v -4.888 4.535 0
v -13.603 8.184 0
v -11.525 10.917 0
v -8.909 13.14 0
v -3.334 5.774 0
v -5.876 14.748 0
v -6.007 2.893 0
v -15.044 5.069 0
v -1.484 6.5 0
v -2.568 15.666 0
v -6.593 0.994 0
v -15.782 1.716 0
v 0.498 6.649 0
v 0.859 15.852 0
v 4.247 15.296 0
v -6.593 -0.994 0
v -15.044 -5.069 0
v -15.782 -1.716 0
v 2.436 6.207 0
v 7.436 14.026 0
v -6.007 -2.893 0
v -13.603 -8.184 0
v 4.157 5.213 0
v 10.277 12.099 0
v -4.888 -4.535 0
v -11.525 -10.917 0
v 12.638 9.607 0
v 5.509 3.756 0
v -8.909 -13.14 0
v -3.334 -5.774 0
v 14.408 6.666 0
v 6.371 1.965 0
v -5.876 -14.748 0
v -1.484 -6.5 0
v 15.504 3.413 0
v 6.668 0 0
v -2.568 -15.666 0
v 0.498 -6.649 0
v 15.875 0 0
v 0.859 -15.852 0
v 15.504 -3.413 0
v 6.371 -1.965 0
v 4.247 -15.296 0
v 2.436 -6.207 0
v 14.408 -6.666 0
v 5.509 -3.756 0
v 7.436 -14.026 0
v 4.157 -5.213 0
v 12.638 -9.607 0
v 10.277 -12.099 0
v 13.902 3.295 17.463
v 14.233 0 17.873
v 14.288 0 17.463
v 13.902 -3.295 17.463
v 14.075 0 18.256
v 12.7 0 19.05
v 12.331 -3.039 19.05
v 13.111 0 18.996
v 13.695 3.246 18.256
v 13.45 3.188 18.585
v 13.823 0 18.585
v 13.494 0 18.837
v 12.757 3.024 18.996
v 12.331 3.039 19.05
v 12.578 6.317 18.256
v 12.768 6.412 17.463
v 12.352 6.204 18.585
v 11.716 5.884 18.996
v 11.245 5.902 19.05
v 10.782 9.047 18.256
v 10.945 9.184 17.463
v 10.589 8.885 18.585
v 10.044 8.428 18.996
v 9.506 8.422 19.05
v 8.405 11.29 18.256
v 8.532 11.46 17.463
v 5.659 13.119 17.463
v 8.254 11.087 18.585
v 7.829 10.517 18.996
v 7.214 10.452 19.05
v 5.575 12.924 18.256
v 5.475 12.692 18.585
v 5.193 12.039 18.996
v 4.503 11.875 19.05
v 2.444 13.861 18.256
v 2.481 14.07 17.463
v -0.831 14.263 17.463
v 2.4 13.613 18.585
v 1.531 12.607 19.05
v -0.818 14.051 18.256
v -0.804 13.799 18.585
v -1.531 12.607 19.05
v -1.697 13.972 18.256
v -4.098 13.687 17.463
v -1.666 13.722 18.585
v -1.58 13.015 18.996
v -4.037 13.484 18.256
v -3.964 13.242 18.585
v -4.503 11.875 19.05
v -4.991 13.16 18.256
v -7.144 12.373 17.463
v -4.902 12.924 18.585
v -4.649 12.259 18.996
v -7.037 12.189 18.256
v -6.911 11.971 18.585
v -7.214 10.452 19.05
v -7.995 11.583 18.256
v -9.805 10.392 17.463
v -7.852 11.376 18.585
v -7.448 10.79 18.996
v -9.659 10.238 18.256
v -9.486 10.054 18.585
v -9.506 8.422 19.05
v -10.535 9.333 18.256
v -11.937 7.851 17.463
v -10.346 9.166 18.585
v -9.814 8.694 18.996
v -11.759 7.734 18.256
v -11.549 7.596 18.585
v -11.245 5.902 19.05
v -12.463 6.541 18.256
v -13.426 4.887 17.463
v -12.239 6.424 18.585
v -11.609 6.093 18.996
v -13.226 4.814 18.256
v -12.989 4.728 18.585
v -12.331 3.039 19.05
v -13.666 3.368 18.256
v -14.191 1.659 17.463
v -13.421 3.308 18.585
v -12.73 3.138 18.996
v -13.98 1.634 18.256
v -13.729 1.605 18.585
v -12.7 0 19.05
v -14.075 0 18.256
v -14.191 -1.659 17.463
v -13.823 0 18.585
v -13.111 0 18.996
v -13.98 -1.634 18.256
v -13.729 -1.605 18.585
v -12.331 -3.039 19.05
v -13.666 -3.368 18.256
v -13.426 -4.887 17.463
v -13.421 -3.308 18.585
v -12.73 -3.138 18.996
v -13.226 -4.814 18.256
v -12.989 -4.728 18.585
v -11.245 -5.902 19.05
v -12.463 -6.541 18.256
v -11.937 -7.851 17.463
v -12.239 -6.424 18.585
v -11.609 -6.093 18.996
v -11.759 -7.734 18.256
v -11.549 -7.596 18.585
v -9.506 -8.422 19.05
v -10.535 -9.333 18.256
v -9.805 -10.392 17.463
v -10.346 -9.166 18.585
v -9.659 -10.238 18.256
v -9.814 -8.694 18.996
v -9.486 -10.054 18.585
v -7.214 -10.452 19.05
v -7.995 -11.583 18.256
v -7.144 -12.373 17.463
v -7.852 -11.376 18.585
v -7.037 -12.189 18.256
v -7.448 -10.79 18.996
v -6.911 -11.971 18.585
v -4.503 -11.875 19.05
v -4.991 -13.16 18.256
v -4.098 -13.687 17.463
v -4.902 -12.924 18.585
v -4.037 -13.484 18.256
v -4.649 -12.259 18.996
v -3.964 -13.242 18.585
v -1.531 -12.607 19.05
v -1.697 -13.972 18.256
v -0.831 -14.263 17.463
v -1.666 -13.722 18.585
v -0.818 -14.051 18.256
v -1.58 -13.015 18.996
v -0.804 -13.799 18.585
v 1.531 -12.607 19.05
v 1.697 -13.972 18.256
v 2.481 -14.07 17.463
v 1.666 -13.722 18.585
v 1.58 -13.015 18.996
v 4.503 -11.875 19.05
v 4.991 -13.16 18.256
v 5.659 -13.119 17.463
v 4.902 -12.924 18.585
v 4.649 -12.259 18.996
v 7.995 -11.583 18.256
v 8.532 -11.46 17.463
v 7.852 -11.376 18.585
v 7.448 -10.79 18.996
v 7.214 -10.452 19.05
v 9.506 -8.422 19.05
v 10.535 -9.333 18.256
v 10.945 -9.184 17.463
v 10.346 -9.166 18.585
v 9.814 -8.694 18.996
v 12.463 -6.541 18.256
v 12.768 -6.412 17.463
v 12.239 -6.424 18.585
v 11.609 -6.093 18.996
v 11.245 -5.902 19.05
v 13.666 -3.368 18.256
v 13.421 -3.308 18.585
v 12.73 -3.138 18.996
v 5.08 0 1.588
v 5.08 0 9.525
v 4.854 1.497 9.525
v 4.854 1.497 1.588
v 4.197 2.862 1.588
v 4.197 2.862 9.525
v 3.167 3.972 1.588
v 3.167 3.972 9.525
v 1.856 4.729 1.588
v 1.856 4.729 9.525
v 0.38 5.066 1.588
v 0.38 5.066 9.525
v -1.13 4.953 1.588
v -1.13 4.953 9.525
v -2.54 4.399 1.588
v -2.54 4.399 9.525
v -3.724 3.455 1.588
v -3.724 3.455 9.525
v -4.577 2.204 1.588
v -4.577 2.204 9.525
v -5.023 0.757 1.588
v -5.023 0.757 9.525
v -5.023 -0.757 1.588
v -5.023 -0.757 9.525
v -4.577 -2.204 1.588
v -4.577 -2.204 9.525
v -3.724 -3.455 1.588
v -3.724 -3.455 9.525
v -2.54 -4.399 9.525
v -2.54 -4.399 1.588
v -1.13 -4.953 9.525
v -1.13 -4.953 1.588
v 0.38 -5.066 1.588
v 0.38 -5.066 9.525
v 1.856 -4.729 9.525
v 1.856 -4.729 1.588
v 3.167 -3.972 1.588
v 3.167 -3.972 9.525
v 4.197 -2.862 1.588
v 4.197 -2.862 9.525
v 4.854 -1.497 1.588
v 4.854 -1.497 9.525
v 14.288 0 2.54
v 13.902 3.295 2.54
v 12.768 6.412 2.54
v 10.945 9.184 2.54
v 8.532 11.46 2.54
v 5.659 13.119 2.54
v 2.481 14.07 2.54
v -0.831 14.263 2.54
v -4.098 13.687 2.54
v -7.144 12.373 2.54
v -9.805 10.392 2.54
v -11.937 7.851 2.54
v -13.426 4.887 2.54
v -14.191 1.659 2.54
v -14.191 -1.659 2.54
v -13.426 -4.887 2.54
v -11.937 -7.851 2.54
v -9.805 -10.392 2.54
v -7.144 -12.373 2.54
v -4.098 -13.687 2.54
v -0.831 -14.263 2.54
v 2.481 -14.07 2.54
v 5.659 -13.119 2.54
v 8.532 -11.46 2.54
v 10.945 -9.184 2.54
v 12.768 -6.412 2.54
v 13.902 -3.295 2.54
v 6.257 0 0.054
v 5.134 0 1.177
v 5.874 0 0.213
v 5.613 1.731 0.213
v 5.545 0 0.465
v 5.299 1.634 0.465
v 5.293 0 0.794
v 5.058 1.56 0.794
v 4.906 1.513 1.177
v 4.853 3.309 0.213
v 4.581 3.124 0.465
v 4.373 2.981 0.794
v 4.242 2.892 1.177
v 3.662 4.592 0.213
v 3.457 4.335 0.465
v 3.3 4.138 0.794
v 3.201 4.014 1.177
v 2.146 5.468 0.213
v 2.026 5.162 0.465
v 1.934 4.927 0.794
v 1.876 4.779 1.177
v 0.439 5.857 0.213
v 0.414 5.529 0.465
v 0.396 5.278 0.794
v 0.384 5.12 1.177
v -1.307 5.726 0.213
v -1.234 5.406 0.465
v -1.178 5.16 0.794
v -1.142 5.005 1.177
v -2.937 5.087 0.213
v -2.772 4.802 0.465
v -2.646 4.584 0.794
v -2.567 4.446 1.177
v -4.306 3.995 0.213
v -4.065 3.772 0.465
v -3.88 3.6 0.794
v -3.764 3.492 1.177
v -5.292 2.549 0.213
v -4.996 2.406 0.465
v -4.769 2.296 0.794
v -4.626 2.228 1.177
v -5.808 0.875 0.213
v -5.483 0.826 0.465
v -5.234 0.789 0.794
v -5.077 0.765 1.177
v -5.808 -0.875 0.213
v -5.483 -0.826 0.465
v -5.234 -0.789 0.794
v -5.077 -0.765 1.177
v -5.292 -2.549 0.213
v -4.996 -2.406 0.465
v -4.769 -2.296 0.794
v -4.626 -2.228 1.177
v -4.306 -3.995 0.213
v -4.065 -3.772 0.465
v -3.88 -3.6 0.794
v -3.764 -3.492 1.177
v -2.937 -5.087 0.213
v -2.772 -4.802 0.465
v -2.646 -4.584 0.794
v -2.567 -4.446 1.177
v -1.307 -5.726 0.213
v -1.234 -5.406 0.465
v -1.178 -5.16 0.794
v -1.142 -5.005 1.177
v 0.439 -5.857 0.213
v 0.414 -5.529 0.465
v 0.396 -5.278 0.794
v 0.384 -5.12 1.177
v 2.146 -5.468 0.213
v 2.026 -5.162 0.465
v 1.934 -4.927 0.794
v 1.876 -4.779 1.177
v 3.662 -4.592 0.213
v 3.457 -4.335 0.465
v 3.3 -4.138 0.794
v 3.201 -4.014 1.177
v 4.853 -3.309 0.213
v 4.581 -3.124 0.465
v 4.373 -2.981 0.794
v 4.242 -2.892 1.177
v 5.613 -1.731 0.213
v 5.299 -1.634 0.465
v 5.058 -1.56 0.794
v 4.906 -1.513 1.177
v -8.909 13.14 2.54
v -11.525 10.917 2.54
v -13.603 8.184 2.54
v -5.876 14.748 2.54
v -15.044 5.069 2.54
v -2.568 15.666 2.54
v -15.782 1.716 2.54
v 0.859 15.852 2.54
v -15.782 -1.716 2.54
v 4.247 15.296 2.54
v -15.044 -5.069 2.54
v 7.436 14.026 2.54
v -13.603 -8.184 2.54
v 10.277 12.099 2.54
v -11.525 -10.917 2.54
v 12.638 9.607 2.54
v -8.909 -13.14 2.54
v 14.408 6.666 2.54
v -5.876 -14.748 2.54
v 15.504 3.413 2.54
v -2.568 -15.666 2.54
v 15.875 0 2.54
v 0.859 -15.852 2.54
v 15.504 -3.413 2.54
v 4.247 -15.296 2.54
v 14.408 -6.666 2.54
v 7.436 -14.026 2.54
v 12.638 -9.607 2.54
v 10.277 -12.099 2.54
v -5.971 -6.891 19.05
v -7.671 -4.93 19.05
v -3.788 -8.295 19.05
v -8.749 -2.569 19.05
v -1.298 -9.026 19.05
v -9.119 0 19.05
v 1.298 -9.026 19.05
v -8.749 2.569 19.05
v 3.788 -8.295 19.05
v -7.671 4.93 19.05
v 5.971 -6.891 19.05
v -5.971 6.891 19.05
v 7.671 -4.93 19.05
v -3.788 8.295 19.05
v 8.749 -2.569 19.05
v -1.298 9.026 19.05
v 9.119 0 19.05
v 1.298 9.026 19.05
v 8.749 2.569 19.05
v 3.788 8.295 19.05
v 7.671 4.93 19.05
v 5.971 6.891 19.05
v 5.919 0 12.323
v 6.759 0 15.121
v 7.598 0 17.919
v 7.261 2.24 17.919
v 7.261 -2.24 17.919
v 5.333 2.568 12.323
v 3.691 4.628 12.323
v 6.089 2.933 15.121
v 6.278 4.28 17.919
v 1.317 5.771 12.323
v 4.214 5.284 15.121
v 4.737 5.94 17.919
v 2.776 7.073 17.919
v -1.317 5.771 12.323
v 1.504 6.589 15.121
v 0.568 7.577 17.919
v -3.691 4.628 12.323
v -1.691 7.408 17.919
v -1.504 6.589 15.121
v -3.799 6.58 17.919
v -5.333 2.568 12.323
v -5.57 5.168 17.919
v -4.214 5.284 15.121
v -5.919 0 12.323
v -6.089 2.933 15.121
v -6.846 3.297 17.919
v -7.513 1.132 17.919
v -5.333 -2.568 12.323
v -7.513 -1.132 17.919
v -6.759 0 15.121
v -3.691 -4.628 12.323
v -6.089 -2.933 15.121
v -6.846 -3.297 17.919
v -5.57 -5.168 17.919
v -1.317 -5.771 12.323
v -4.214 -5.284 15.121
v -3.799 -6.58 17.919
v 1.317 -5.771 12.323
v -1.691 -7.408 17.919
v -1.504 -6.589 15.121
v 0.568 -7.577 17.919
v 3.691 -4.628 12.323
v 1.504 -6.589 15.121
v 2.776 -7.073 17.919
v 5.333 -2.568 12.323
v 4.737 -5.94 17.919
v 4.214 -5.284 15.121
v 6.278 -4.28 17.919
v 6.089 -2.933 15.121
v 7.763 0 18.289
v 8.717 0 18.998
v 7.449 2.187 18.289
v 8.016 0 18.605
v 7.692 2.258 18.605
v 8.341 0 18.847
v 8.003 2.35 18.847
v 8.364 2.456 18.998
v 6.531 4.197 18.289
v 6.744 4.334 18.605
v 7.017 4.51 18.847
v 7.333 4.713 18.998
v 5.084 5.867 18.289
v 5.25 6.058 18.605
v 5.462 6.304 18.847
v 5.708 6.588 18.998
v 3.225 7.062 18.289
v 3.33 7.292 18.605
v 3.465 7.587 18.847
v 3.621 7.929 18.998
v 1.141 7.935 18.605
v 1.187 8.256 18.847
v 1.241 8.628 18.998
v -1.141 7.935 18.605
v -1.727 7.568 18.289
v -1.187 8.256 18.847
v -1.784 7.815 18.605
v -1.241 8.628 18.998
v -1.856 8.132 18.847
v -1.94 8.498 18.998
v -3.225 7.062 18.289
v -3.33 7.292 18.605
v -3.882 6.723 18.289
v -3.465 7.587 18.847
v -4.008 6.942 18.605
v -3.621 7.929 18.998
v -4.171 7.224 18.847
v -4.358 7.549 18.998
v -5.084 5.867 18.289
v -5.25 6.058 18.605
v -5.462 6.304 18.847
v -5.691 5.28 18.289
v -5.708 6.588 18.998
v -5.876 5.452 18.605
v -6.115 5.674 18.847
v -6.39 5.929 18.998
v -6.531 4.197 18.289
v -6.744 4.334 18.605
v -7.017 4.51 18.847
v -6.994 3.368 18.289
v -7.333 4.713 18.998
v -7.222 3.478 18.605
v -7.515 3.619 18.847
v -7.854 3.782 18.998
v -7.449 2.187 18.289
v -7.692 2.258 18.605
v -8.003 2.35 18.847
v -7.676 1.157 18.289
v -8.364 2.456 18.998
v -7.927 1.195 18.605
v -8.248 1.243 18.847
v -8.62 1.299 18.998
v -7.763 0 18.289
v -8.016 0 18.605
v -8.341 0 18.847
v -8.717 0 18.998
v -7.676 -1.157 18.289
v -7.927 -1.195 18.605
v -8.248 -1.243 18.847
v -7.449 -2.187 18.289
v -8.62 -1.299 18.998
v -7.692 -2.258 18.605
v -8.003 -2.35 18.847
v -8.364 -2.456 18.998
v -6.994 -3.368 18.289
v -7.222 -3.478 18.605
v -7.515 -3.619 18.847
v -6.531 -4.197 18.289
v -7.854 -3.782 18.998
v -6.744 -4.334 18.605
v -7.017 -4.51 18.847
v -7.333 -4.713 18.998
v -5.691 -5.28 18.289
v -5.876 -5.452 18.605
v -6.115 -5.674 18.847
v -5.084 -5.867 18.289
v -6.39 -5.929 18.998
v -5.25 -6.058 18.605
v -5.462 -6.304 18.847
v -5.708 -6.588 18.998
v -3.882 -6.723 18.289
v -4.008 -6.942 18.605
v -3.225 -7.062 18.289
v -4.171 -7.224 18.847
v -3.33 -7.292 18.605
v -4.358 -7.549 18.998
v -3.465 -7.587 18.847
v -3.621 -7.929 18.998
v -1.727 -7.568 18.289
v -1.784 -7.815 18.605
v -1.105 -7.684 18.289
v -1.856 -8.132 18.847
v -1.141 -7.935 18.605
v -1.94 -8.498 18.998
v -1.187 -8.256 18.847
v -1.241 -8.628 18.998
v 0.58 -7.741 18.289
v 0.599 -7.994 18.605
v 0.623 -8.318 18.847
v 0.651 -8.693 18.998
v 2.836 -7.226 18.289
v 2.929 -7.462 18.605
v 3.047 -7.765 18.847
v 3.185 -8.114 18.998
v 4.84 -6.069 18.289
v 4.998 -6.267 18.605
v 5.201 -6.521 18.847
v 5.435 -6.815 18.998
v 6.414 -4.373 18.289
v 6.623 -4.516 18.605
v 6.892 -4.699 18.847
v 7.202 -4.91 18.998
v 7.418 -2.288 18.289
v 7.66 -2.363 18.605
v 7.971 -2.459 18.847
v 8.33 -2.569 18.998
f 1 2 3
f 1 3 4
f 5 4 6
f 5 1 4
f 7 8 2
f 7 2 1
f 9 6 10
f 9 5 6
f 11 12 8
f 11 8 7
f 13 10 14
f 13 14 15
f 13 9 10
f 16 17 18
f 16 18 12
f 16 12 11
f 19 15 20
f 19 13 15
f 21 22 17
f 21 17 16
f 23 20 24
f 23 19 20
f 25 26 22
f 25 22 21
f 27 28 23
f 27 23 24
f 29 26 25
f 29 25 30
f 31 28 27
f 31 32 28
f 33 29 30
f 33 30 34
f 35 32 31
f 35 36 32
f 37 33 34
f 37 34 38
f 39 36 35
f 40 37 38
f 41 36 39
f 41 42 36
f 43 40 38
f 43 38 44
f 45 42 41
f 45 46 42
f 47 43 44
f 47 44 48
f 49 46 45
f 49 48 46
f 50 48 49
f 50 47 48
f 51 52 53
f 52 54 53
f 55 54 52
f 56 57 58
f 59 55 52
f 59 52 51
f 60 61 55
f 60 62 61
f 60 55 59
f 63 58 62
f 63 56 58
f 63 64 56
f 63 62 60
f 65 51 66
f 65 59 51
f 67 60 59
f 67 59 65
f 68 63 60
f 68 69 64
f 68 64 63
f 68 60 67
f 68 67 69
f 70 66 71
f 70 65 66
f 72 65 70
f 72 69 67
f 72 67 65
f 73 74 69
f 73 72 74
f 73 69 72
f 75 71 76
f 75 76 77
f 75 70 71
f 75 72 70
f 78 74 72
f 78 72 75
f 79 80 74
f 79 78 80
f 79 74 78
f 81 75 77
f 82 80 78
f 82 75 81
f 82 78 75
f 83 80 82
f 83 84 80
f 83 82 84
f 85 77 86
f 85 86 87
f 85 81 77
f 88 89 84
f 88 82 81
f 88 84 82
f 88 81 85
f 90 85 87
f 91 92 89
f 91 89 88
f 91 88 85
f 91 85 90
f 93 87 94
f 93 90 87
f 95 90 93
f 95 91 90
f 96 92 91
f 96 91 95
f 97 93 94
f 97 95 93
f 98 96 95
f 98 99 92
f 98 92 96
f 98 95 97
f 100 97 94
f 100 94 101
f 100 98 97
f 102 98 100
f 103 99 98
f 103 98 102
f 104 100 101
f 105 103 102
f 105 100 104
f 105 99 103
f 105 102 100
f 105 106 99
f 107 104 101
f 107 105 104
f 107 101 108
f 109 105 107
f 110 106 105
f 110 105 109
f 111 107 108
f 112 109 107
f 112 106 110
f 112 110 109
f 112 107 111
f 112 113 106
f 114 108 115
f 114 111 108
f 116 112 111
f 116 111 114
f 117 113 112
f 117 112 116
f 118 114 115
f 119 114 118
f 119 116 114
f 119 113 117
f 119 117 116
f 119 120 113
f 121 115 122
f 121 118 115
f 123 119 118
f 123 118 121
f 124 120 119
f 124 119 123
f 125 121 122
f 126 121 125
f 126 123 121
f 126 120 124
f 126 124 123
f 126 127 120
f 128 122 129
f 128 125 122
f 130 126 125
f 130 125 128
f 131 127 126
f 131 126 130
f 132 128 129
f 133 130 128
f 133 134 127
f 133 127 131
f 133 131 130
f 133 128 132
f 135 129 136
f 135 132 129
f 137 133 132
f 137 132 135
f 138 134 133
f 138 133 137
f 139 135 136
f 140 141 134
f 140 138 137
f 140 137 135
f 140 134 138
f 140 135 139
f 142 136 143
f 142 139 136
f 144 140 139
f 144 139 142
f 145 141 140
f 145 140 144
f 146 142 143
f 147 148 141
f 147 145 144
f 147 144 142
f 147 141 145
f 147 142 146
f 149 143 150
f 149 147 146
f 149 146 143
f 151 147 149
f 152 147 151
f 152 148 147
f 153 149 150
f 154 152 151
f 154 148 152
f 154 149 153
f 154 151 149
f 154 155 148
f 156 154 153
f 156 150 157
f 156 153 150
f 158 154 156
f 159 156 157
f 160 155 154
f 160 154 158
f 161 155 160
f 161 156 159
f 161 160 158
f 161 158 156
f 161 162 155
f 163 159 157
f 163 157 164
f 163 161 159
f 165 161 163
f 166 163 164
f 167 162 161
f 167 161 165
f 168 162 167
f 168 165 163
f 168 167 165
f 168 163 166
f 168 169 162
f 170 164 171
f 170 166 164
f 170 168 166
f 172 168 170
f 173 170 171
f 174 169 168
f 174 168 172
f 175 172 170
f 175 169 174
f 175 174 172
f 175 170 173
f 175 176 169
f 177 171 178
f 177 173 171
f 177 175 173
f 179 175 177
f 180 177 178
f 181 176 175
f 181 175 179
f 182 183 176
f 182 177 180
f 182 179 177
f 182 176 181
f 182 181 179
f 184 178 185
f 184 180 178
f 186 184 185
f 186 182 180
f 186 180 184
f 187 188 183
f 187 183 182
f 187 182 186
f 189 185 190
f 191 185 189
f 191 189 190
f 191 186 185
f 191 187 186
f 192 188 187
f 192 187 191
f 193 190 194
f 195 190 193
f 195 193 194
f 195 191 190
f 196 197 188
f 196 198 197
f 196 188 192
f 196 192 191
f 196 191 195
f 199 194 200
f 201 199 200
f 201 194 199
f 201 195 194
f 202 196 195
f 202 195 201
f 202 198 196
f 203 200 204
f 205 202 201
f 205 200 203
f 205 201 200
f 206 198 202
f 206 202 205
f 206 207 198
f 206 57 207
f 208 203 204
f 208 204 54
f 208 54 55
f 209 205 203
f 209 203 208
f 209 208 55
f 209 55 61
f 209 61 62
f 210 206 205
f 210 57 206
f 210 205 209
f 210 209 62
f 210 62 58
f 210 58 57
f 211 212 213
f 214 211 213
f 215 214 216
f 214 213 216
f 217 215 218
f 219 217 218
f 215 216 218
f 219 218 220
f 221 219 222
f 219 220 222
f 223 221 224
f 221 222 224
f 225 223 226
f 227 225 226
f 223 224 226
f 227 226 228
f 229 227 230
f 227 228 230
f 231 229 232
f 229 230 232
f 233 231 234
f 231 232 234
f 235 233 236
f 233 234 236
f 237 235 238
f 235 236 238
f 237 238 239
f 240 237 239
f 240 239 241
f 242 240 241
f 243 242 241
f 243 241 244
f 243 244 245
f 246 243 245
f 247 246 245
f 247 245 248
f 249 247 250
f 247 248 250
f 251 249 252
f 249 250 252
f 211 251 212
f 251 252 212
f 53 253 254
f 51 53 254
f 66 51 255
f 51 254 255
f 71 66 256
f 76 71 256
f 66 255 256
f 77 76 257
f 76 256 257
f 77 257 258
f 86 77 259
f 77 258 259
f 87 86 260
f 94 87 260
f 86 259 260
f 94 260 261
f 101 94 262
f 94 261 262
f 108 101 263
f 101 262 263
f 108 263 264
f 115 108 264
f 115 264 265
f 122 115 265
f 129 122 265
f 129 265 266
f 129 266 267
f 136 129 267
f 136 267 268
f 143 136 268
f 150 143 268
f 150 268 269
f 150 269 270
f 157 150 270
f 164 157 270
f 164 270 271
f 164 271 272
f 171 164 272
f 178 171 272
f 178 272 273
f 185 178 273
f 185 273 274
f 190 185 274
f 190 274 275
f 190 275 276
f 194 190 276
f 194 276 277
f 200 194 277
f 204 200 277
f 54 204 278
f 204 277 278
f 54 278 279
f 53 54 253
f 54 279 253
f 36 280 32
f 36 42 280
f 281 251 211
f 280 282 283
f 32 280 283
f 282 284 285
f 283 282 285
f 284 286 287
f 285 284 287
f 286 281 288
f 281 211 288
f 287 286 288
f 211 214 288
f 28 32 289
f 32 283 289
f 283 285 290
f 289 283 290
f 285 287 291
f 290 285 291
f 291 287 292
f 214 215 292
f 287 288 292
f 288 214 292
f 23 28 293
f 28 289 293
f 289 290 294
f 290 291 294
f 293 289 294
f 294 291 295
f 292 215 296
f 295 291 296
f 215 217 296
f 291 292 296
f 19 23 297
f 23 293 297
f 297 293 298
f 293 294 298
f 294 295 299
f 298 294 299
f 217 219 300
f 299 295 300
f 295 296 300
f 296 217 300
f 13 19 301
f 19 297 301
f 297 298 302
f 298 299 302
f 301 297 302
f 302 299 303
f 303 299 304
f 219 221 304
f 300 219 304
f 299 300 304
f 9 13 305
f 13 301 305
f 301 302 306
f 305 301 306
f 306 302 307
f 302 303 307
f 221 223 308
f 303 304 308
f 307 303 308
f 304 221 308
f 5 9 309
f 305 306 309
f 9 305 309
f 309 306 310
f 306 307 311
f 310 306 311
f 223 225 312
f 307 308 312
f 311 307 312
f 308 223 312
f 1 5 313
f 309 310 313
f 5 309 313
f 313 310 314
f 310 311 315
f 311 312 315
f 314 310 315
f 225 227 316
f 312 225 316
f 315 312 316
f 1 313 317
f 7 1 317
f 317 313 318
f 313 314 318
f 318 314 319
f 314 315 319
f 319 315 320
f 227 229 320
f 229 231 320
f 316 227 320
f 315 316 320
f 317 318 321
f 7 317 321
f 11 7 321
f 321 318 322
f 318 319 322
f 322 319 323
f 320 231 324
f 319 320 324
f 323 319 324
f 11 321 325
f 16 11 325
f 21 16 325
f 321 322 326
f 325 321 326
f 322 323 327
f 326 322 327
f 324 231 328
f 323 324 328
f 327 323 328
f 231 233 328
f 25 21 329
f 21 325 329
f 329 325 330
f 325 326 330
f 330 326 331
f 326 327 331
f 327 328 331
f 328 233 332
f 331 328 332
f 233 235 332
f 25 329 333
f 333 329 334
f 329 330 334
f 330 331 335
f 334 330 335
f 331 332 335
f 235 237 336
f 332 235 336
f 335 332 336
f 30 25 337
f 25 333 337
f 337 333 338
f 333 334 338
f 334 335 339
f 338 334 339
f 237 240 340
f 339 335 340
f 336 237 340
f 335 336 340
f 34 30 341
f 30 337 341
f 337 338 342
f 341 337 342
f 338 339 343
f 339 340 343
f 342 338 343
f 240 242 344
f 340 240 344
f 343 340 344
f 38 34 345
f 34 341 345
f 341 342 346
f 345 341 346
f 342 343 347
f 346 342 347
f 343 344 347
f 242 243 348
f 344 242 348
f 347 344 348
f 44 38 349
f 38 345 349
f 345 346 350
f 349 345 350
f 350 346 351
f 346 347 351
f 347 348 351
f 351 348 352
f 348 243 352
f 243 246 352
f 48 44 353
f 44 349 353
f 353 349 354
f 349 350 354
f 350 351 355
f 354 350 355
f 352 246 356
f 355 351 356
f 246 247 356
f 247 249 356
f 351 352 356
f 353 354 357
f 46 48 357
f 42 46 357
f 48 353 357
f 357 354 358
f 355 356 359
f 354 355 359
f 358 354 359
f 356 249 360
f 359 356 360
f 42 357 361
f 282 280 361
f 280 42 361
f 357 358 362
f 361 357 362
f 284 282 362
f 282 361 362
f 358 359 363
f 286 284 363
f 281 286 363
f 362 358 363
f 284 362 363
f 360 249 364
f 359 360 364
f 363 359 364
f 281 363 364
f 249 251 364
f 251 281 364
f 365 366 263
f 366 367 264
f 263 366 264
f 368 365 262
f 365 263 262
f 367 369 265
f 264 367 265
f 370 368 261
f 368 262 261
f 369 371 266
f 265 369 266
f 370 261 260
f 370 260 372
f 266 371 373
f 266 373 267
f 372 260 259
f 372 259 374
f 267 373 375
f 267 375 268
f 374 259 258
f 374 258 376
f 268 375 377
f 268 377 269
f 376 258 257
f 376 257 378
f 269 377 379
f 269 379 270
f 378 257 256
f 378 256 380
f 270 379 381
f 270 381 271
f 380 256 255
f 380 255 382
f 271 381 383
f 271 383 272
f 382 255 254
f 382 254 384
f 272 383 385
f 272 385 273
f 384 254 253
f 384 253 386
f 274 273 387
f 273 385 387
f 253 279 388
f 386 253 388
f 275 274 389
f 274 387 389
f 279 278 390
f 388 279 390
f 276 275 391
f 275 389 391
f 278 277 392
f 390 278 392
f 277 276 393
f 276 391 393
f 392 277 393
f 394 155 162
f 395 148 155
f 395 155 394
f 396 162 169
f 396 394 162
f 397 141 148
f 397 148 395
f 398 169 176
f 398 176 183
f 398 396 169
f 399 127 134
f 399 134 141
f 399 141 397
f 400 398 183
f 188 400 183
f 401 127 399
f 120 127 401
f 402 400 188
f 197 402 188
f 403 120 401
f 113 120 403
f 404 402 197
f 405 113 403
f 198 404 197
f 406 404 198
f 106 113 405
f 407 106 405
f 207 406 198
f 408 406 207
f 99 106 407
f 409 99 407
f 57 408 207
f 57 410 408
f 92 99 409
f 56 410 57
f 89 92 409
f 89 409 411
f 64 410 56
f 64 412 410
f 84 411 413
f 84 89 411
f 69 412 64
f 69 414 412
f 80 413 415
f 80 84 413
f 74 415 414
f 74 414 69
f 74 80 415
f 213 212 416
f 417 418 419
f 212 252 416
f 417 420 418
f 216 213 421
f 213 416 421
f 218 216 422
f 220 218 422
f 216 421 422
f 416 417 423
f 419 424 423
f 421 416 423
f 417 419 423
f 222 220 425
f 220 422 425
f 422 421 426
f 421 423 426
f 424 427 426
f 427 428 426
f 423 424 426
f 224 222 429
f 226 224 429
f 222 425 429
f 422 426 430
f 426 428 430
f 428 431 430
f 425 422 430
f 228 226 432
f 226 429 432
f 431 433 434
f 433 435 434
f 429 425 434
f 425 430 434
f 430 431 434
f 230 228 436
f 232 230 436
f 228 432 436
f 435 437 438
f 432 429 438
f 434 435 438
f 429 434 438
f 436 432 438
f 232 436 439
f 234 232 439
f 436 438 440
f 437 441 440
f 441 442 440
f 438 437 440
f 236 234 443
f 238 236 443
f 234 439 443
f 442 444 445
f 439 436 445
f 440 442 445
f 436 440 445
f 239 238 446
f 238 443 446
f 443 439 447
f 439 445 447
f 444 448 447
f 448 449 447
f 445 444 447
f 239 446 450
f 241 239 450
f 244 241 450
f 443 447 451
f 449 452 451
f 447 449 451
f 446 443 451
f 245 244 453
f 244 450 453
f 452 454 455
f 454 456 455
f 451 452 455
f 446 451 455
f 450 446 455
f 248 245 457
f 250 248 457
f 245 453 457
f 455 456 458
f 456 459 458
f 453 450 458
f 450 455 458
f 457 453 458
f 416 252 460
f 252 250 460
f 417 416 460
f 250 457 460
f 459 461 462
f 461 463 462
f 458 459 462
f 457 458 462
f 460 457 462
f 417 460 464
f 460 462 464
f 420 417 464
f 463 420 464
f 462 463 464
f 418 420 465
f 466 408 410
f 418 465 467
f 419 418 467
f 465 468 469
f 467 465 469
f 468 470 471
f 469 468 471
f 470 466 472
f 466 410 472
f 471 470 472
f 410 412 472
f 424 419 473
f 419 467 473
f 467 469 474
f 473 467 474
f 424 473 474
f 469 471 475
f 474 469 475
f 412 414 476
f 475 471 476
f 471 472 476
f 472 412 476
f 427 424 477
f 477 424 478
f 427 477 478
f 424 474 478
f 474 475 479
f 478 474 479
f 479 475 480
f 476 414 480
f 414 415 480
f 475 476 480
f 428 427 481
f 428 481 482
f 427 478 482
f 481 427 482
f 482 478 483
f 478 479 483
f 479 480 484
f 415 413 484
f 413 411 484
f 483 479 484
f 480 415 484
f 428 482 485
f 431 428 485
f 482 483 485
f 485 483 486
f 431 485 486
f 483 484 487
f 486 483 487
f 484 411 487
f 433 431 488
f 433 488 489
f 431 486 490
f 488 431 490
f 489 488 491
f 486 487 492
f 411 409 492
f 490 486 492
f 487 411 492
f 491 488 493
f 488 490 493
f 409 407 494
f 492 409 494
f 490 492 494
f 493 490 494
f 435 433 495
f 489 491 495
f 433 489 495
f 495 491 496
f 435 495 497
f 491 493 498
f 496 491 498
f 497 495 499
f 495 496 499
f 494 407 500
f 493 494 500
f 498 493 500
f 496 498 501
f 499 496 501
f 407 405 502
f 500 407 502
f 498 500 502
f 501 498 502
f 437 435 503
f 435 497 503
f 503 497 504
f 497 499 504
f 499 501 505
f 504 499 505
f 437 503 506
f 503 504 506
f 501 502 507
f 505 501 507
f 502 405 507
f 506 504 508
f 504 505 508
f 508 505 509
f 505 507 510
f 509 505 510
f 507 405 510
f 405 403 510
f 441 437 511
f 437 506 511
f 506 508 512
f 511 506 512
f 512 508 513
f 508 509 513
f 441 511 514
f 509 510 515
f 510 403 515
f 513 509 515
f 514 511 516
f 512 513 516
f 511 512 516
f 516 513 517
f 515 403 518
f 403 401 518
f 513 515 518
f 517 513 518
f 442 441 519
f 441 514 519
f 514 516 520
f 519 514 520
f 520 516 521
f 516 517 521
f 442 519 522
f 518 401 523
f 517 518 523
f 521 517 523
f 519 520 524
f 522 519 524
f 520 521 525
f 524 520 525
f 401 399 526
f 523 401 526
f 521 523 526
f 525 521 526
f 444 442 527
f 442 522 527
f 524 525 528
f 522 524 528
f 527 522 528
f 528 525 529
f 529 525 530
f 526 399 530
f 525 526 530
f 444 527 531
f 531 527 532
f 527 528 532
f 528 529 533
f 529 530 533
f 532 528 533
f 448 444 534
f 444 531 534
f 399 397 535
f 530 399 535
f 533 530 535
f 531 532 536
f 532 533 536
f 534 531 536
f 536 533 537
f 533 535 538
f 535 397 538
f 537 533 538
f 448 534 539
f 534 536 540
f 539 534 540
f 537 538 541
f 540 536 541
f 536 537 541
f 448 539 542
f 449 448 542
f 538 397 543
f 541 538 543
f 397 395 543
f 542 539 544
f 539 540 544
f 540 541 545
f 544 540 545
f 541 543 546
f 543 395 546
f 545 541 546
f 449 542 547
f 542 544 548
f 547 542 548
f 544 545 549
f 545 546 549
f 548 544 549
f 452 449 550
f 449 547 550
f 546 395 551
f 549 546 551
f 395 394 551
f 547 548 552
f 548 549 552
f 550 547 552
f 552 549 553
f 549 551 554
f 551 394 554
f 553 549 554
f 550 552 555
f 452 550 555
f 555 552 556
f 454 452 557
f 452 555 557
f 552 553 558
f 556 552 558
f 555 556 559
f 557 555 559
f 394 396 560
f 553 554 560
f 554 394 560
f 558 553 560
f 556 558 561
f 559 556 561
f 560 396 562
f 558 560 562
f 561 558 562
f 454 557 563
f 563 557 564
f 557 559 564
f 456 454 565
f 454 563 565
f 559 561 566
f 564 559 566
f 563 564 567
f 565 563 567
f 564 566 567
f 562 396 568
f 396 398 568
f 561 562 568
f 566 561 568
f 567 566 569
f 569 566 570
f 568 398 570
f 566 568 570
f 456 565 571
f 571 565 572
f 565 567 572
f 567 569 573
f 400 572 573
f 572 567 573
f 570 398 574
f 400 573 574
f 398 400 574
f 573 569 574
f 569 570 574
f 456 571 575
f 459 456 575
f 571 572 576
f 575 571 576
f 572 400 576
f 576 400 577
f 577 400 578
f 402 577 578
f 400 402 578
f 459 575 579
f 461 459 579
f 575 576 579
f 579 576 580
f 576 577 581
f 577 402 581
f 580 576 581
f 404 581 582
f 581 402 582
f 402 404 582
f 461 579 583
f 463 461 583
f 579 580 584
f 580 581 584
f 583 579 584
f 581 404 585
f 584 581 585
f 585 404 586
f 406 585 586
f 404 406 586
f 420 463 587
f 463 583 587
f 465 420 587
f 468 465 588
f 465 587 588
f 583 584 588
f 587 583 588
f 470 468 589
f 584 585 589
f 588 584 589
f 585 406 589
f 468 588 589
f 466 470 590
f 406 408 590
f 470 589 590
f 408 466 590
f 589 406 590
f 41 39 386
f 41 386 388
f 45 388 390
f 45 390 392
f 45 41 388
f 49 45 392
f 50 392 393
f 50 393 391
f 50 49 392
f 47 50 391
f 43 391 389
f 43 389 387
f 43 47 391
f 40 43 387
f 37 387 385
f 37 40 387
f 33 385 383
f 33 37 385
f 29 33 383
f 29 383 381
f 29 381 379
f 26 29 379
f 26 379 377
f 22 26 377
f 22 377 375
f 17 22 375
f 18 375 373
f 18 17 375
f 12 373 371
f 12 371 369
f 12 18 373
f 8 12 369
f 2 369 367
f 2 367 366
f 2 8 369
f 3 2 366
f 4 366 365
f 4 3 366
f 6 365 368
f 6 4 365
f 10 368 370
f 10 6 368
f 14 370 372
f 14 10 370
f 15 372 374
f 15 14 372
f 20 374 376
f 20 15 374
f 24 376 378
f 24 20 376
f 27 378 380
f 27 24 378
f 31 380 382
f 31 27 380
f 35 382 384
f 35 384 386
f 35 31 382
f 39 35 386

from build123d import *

# Parameters (mm, degrees)
F0_R     = 14.2875
F1_DEPTH = 19.05
F2_R     = 15.875
F3_DEPTH = 2.54
F6_R     = 1.5875


with BuildPart() as f1:
    # F0 (on Top) → F1 (new body)
    with BuildSketch(Plane.XY):
        Circle(F0_R)
    extrude(amount=F1_DEPTH)

    # F2 (on face) → F3 (join)
    with BuildSketch(Plane(origin=(0, 0, 0), x_dir=(1, 0, 0), z_dir=(0, 0, -1))):
        Circle(F2_R)
    extrude(amount=-F3_DEPTH)

    # F4 (on Front) → F5 (revolve, cut)
    with BuildSketch(Plane.XZ):
        Polygon((0, 19.05), (0, 0), (5.08, 0), (5.08, 9.525), (7.9375, 19.05), align=None)
    revolve(axis=Axis((0, 0, 9.525), (0, 0, 1)), mode=Mode.SUBTRACT)

    # F6
    f6_edges = [f1.edges().sort_by_distance(p)[0] for p in [
        (-14.2875, 0, 19.05),
        (-7.9375, 0, 19.05),
        (-5.08, 0, 0),
    ]]
    fillet(f6_edges, radius=F6_R)


solid = f1.part
